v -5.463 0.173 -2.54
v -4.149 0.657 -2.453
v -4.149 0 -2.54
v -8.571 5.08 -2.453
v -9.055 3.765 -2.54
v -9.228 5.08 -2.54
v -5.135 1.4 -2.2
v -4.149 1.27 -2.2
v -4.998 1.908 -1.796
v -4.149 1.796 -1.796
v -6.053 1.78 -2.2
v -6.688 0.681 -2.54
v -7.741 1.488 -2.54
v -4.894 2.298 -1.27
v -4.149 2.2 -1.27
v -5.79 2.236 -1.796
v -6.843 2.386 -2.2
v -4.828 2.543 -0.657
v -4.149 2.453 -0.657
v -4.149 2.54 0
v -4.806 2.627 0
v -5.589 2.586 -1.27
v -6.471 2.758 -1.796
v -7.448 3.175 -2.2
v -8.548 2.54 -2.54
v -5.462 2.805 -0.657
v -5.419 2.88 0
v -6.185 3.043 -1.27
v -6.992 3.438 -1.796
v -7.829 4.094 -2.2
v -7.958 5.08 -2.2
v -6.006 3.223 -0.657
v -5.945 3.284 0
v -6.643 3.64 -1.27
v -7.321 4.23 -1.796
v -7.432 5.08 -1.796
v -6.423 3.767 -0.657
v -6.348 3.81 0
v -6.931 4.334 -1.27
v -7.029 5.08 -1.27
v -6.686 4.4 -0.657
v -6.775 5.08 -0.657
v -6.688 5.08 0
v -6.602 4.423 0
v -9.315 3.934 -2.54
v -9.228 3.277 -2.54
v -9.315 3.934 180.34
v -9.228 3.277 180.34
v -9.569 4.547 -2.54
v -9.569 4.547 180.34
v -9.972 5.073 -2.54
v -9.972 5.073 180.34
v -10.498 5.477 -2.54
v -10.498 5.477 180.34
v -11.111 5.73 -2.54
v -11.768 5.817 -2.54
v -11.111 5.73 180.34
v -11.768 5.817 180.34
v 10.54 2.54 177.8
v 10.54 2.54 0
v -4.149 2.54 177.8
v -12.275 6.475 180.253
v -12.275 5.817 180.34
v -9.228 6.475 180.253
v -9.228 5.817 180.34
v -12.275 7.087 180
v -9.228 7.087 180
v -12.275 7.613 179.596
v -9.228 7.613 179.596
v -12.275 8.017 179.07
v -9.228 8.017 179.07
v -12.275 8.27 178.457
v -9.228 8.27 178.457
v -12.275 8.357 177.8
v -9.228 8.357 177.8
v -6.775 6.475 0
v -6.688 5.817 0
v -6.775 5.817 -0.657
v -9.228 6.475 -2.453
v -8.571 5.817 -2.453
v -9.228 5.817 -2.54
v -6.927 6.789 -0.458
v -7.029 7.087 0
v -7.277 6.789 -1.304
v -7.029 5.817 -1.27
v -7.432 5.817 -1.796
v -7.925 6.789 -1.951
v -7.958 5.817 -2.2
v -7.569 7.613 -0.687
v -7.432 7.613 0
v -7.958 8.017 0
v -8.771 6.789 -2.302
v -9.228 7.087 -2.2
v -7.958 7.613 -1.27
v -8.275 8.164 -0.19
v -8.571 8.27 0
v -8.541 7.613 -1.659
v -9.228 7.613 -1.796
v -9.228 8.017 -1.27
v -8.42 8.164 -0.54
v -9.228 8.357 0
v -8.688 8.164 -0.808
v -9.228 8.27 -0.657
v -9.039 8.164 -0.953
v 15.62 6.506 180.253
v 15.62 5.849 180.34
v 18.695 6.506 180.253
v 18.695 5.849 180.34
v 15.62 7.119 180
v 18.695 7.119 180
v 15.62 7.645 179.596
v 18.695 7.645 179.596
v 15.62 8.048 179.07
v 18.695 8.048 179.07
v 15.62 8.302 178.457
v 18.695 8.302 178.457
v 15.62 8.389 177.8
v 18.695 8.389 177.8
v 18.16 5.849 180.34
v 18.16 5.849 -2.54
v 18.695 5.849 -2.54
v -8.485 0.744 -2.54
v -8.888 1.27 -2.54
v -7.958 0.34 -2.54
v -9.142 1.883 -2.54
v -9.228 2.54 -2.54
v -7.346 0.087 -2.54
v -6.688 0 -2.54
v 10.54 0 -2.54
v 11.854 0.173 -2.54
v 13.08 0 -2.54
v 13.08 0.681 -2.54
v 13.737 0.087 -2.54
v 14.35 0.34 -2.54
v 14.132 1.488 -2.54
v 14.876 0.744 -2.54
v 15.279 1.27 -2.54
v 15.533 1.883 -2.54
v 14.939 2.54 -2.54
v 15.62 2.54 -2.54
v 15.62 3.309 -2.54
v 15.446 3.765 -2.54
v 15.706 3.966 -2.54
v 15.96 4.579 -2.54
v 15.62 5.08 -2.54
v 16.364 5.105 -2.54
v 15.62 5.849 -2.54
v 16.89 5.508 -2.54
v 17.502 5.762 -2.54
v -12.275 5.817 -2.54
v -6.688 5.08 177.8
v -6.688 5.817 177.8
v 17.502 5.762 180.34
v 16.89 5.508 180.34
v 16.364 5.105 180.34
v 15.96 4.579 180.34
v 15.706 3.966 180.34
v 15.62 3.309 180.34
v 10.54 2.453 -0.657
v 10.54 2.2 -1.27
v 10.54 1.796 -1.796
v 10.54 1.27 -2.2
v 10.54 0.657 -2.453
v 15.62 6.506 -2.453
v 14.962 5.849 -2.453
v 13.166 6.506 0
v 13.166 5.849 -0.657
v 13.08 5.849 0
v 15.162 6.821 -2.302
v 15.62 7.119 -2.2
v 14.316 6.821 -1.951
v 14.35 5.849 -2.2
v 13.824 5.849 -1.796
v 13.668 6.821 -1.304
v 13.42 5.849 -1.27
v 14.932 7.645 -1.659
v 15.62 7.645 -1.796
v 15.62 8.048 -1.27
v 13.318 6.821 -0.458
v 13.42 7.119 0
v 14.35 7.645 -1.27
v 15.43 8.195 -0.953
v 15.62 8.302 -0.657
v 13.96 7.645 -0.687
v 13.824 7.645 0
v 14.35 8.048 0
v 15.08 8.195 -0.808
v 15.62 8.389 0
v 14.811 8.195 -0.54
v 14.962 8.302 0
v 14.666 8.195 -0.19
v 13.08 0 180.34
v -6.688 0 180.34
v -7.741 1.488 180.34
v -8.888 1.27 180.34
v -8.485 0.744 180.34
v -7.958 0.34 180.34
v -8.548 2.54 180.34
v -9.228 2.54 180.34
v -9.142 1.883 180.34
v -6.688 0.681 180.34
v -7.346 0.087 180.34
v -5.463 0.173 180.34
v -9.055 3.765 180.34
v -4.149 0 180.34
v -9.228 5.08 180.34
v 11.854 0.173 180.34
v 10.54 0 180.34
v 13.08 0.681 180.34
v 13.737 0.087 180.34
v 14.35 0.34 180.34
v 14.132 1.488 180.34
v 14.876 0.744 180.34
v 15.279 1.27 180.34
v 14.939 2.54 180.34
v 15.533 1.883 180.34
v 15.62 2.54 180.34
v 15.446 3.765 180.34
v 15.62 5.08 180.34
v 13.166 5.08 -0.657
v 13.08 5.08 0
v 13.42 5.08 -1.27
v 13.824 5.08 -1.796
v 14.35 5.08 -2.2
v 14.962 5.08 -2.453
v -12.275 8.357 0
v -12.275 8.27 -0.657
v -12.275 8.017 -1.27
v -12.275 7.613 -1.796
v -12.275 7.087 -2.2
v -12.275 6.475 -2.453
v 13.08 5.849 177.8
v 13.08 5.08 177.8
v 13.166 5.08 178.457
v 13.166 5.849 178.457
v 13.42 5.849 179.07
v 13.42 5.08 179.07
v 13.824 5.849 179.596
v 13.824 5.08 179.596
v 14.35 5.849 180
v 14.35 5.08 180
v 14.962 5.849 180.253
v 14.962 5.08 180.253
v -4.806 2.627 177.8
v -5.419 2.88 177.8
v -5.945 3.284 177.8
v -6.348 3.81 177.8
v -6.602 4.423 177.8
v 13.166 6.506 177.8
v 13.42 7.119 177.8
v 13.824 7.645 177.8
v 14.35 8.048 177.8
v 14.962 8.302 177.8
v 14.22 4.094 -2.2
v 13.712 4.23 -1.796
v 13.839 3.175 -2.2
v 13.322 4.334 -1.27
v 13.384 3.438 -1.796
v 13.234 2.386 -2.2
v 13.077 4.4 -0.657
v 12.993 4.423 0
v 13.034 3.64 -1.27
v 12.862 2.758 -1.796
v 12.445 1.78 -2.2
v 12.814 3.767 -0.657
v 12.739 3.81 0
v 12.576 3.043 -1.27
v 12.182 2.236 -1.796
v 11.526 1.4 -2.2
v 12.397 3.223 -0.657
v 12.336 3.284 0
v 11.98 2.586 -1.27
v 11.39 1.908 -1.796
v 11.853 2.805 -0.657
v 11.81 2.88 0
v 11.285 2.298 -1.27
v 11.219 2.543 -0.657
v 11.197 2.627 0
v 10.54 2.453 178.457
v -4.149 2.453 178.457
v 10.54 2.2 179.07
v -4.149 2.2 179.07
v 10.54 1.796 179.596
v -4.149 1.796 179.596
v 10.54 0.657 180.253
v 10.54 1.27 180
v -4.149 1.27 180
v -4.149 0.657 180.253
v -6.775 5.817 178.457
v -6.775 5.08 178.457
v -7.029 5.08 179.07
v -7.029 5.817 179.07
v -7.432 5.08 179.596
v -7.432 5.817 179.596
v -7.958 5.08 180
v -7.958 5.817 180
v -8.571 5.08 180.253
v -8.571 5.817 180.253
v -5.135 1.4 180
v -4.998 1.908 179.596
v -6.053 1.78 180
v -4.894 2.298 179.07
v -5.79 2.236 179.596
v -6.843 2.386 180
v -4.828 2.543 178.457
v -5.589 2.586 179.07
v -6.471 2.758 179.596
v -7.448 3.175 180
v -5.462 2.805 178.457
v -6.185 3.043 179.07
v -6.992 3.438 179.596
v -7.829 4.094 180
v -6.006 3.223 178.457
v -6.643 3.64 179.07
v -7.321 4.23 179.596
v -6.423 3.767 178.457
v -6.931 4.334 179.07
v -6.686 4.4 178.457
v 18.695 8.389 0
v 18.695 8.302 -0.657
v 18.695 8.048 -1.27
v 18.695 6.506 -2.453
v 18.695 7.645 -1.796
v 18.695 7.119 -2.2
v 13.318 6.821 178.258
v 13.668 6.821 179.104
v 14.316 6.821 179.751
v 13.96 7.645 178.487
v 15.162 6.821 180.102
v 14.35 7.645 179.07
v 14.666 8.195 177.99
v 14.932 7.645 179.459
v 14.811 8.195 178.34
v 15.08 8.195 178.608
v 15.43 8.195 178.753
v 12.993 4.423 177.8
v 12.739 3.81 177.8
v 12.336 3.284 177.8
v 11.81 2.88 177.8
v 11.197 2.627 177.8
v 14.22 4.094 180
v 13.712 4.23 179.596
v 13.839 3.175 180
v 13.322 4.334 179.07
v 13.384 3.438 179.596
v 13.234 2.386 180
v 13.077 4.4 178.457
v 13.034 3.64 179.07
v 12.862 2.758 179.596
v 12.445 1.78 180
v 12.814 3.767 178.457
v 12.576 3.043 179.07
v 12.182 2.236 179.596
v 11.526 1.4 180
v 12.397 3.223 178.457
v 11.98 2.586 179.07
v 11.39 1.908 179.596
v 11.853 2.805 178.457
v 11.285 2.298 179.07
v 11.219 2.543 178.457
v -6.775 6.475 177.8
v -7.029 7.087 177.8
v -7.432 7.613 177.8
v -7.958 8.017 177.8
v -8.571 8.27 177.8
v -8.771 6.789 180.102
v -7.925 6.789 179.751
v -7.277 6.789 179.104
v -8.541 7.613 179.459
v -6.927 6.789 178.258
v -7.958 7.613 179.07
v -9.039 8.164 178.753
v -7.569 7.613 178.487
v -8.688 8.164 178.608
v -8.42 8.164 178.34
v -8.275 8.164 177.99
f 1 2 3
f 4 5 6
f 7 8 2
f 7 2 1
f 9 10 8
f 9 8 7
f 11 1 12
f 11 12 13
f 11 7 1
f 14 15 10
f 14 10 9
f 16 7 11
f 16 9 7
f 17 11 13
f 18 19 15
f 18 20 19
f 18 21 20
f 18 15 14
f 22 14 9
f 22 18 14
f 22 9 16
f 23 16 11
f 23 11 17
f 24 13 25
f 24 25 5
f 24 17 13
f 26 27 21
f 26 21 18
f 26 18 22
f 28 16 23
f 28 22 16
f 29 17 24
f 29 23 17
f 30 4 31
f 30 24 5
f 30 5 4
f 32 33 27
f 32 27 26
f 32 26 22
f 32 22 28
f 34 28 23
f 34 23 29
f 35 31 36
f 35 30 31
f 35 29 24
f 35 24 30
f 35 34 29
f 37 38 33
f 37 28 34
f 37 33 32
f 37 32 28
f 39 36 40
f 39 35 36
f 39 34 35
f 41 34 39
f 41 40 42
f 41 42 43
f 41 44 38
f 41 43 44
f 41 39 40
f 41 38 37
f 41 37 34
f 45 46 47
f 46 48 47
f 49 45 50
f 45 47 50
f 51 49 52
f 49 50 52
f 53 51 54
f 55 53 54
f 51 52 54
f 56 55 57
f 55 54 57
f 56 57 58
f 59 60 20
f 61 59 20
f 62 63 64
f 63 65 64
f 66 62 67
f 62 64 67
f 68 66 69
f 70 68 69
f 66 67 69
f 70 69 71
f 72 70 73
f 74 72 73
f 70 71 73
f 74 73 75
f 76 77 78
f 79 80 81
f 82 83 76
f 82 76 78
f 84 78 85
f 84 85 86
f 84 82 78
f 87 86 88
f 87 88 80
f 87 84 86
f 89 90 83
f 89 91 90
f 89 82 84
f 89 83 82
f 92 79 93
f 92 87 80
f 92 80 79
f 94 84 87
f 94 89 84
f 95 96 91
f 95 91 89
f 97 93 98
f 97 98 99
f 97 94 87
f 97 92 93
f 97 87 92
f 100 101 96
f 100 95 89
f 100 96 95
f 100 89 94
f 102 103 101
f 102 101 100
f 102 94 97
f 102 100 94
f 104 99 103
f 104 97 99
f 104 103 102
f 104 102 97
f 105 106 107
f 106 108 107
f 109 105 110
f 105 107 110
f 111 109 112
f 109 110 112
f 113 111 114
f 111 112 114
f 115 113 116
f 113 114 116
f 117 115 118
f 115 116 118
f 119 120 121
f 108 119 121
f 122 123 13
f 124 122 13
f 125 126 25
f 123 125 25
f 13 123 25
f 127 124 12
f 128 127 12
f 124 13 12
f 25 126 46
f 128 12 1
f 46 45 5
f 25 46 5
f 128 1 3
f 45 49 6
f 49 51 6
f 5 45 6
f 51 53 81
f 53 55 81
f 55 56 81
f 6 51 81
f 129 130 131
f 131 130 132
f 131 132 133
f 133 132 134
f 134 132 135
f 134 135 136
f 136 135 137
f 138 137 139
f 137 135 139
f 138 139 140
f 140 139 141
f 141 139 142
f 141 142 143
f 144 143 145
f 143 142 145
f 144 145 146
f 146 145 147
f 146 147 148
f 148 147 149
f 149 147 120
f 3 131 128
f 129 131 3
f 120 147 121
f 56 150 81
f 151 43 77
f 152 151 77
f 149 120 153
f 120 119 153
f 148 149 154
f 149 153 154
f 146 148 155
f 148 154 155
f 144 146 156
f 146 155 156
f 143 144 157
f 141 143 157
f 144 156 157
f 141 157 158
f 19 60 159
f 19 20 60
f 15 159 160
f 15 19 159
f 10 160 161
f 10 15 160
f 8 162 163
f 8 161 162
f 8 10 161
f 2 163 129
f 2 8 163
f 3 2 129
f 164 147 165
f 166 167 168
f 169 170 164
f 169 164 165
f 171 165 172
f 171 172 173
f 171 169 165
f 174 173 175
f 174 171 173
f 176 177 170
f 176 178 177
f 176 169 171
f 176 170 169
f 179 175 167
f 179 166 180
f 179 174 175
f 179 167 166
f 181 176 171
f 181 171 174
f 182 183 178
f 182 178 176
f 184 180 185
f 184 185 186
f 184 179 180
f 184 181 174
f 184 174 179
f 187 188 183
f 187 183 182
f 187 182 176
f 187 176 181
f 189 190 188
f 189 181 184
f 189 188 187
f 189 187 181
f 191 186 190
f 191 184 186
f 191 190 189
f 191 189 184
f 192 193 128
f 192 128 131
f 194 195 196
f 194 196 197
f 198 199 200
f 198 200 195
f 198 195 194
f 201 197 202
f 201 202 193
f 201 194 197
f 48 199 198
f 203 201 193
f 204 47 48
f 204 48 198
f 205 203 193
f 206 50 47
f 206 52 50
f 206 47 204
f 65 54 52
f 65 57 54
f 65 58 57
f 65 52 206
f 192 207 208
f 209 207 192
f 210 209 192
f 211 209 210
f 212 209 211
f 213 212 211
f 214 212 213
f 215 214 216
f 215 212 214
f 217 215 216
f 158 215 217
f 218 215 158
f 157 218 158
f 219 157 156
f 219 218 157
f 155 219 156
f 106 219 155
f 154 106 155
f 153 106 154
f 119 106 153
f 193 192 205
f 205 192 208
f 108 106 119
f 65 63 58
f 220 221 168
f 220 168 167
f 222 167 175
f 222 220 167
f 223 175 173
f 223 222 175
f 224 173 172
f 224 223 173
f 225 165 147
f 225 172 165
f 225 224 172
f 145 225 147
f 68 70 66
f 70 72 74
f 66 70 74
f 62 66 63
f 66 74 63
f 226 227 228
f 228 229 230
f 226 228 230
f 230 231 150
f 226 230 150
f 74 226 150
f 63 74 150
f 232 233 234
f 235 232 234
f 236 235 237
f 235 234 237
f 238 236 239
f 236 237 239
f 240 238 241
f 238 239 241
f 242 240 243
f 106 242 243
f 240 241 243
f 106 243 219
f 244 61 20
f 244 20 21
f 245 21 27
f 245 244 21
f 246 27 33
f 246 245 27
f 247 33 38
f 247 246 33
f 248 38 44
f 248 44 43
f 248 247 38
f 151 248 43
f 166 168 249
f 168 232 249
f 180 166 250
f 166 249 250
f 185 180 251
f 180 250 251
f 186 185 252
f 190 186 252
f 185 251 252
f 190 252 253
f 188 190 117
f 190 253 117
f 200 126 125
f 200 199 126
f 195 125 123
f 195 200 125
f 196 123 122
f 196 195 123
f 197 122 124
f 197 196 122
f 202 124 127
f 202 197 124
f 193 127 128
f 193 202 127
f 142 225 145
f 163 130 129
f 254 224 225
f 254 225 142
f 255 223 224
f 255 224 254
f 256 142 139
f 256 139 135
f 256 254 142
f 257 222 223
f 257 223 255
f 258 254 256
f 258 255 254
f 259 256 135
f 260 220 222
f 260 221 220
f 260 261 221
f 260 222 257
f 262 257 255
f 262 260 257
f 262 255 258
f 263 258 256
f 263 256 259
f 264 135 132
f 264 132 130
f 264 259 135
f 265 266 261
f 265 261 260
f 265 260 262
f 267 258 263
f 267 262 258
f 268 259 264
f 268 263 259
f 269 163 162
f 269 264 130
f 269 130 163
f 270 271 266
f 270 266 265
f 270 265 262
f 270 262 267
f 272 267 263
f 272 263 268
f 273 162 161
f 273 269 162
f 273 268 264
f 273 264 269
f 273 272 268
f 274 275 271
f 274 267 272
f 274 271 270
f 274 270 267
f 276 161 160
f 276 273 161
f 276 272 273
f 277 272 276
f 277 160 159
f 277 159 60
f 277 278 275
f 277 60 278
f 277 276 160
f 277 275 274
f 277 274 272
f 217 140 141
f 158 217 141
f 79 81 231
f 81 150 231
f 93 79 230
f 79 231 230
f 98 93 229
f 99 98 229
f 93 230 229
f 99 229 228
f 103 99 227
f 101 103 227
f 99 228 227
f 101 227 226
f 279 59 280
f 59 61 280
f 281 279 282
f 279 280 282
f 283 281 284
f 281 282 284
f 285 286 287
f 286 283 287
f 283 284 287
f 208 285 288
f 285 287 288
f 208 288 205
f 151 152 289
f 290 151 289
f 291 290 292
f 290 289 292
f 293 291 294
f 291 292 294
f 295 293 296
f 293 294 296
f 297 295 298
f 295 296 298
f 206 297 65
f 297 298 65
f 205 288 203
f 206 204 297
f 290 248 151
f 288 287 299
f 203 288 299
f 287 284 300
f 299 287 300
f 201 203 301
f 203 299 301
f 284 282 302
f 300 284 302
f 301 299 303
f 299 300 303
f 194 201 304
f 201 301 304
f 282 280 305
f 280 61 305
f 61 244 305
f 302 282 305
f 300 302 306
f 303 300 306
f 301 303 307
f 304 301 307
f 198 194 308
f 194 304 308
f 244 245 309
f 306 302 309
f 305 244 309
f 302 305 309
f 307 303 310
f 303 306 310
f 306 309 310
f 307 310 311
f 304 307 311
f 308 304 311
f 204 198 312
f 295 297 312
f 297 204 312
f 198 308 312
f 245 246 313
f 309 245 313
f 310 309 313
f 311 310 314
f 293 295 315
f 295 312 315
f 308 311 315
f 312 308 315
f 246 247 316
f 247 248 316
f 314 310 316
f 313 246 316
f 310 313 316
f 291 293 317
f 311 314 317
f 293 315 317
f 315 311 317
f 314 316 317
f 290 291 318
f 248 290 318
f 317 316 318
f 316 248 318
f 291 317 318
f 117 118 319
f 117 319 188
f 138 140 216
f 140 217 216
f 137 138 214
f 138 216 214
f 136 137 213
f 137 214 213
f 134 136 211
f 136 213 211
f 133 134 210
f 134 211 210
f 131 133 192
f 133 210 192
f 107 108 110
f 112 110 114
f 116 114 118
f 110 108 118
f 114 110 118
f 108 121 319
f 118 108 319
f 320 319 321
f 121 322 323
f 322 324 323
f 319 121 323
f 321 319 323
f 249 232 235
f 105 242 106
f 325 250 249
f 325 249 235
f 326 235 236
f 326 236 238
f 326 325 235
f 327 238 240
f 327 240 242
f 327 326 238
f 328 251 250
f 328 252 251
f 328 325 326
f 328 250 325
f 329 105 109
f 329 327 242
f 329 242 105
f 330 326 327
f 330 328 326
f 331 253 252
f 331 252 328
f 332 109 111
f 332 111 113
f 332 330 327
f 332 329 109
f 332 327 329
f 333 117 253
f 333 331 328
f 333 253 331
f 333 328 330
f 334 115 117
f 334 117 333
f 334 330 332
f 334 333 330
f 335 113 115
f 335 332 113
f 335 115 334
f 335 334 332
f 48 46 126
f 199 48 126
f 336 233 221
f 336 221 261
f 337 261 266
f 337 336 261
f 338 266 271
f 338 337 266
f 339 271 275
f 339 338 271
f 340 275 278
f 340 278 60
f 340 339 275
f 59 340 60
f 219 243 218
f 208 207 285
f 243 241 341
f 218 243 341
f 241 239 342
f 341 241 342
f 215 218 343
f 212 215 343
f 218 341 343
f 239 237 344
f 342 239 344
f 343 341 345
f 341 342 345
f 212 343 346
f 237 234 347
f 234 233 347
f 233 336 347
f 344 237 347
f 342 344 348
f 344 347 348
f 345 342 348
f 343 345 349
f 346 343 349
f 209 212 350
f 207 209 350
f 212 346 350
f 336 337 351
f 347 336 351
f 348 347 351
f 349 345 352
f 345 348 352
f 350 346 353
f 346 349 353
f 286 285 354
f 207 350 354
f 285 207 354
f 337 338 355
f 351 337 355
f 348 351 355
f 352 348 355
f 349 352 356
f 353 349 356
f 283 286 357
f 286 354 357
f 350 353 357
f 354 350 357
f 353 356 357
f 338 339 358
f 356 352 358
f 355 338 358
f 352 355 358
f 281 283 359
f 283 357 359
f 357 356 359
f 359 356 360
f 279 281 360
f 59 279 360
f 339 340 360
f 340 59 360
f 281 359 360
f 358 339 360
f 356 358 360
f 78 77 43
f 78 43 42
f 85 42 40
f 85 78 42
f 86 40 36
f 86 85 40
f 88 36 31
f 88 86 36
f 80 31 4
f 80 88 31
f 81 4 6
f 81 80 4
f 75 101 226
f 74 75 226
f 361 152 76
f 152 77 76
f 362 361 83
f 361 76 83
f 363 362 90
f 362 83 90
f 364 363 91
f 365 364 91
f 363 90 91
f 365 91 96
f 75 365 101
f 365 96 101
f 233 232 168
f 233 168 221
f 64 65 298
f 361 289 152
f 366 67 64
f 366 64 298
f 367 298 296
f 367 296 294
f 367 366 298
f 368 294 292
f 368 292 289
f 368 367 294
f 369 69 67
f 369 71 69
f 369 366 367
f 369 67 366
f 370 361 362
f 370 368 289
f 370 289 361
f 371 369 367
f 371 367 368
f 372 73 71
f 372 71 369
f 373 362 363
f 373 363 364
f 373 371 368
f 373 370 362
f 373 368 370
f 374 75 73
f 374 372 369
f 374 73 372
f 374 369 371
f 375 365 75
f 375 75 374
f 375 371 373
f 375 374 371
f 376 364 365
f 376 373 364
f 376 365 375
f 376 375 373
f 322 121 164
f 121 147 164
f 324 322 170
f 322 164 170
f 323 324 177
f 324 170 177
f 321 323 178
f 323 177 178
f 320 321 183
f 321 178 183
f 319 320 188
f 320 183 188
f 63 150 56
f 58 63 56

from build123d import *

# Parameters (mm, degrees)
EXTRUDE_THIN2_DEPTH      = 180.34
EXTRUDE_THIN2_DEPTH_BACK = 2.54
FILLET1_R                = 2.54
FILLET2_R                = 2.54
FILLET3_R                = 2.54
FILLET4_R                = 2.54
FILLET5_R                = 2.54
FILLET6_R                = 2.54
FILLET7_R                = 2.54


with BuildPart() as part:
    # Sketch2 → Extrude-Thin2 (new, two sides: drawn at the far end of the back side and taken through both)
    with BuildSketch(Plane.XY.offset(-EXTRUDE_THIN2_DEPTH_BACK)):
        Polygon((-12.274730593, 5.817033739), (-9.228474815, 5.817033739), (-9.228474815, 0), (15.619605828, 0), (15.619605828, 5.848528279), (18.694831425, 5.848528279), (18.694831425, 8.388528279), (13.079605828, 8.388528279), (13.079605828, 2.54), (-6.688474815, 2.54), (-6.688474815, 8.357033739), (-12.274730593, 8.357033739), align=None)
    extrude(amount=EXTRUDE_THIN2_DEPTH + EXTRUDE_THIN2_DEPTH_BACK)

    # Fillet1
    fillet1_edges = [part.edges().sort_by_distance(p)[0] for p in [
        (-6.688474815, 2.54, 88.9),
        (13.079605828, 2.54, 88.9),
        (13.079605828, 5.46426414, 180.34),
        (3.195565506, 2.54, 180.34),
        (-6.688474815, 5.44851687, 180.34),
        (13.079605828, 5.46426414, -2.54),
        (3.195565506, 2.54, -2.54),
        (-6.688474815, 5.44851687, -2.54),
    ]]
    fillet(fillet1_edges, radius=FILLET1_R - 0.0001)  # a hair under: the kernel refuses the full size

    # Fillet2
    fillet2_edges = [part.edges().sort_by_distance(p)[0] for p in [
        (15.619605828, 5.848528279, 88.9),
    ]]
    fillet(fillet2_edges, radius=FILLET2_R)

    # Fillet3
    fillet3_edges = [part.edges().sort_by_distance(p)[0] for p in [
        (17.157168626, 8.388528279, -2.54),
        (17.157168626, 8.388528279, 180.34),
        (13.079605828, 8.388528279, 88.9),
        (13.823525314, 8.388528279, 179.596080514),
        (13.823525314, 8.388528279, -1.796080514),
    ]]
    fillet(fillet3_edges, radius=FILLET3_R - 0.0001)  # a hair under: the kernel refuses the full size

    # Fillet4
    fillet4_edges = [part.edges().sort_by_distance(p)[0] for p in [
        (15.619605828, 0, 88.9),
    ]]
    fillet(fillet4_edges, radius=FILLET4_R)

    # Fillet5
    fillet5_edges = [part.edges().sort_by_distance(p)[0] for p in [
        (-10.751552704, 8.357033739, -2.54),
        (-6.688474815, 8.357033739, 88.9),
        (-10.751552704, 8.357033739, 180.34),
        (-7.432394301, 8.357033739, 179.596080514),
        (-7.432394301, 8.357033739, -1.796080514),
    ]]
    fillet(fillet5_edges, radius=FILLET5_R - 0.0001)  # a hair under: the kernel refuses the full size

    # Fillet6
    fillet6_edges = [part.edges().sort_by_distance(p)[0] for p in [
        (-9.228474815, 0, 88.9),
    ]]
    fillet(fillet6_edges, radius=FILLET6_R)

    # Fillet7
    fillet7_edges = [part.edges().sort_by_distance(p)[0] for p in [
        (-9.228474815, 5.817033739, 88.9),
    ]]
    fillet(fillet7_edges, radius=FILLET7_R)


solid = part.part
